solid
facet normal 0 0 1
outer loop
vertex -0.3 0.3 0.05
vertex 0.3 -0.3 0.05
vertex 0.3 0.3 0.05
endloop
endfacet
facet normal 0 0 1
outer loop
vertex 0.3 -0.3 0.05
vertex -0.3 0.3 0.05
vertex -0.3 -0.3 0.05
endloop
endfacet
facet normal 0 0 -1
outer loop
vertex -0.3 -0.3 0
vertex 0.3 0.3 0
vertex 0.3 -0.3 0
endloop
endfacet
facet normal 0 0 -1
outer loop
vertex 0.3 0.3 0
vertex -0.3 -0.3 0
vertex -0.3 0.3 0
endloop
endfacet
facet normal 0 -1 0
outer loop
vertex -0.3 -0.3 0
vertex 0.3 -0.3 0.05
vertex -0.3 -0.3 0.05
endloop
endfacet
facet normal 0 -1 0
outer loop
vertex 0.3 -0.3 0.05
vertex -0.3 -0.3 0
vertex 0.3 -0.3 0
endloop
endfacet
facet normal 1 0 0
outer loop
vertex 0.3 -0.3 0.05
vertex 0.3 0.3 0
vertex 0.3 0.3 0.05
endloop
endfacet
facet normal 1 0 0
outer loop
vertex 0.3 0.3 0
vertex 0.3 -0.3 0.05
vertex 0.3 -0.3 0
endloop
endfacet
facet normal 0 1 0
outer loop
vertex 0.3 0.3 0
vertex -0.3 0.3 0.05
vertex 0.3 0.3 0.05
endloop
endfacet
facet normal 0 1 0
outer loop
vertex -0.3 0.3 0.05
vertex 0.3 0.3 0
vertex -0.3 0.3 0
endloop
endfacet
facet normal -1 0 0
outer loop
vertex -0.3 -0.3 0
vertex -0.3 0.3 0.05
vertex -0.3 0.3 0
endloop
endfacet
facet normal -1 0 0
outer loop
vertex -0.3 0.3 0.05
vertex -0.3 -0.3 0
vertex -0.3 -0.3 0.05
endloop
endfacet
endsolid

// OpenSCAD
// file: lib.scad
function x(v) = v[0];
function y(v) = v[1];
function z(v) = v[2];
function add(v1,v2) = [ for (i = [ 0 : len(v1)-1 ]) v1[i] + v2[i] ];
function xv(d) = [d,0,0];
function yv(d) = [0,d,0];
function zv(d) = [0,0,d];

module box(v) { cube(size=v, center=true); }
module cyl(r1,r2,h) { cylinder(r1=r1, r2=r2, h=h, center=true); }

function grow(n,v) = [x(v)+n*2, y(v)+n*2, z(v)+n*2];

module rbox(v, radius=1) {
	cx = x(v)/2-radius;
	cy = y(v)/2-radius;
	cz = z(v)/2-radius;

	hull() {
		translate([cx,cy,cz]) sphere(r=radius);
		translate([cx,cy,-cz]) sphere(r=radius);
		translate([cx,-cy,cz]) sphere(r=radius);
		translate([cx,-cy,-cz]) sphere(r=radius);
		translate([-cx,cy,cz]) sphere(r=radius);
		translate([-cx,cy,-cz]) sphere(r=radius);
		translate([-cx,-cy,cz]) sphere(r=radius);
		translate([-cx,-cy,-cz]) sphere(r=radius);
	}
}

module fillet(r=1) {
  minkowski() {
    difference() {
      children();
      minkowski() {
        difference() {
          minkowski() {
            children();
            sphere(r=r);
          }
          children();
        }
        sphere(r=r);
      }
    }
    sphere(r=r);
  }
}
// main file
use <lib.scad>

module plate() {
	translate([0,0,0.025]) box([0.6,0.6,0.05]);
}

//fillet(0.01, $fn=16) plate();
plate();
